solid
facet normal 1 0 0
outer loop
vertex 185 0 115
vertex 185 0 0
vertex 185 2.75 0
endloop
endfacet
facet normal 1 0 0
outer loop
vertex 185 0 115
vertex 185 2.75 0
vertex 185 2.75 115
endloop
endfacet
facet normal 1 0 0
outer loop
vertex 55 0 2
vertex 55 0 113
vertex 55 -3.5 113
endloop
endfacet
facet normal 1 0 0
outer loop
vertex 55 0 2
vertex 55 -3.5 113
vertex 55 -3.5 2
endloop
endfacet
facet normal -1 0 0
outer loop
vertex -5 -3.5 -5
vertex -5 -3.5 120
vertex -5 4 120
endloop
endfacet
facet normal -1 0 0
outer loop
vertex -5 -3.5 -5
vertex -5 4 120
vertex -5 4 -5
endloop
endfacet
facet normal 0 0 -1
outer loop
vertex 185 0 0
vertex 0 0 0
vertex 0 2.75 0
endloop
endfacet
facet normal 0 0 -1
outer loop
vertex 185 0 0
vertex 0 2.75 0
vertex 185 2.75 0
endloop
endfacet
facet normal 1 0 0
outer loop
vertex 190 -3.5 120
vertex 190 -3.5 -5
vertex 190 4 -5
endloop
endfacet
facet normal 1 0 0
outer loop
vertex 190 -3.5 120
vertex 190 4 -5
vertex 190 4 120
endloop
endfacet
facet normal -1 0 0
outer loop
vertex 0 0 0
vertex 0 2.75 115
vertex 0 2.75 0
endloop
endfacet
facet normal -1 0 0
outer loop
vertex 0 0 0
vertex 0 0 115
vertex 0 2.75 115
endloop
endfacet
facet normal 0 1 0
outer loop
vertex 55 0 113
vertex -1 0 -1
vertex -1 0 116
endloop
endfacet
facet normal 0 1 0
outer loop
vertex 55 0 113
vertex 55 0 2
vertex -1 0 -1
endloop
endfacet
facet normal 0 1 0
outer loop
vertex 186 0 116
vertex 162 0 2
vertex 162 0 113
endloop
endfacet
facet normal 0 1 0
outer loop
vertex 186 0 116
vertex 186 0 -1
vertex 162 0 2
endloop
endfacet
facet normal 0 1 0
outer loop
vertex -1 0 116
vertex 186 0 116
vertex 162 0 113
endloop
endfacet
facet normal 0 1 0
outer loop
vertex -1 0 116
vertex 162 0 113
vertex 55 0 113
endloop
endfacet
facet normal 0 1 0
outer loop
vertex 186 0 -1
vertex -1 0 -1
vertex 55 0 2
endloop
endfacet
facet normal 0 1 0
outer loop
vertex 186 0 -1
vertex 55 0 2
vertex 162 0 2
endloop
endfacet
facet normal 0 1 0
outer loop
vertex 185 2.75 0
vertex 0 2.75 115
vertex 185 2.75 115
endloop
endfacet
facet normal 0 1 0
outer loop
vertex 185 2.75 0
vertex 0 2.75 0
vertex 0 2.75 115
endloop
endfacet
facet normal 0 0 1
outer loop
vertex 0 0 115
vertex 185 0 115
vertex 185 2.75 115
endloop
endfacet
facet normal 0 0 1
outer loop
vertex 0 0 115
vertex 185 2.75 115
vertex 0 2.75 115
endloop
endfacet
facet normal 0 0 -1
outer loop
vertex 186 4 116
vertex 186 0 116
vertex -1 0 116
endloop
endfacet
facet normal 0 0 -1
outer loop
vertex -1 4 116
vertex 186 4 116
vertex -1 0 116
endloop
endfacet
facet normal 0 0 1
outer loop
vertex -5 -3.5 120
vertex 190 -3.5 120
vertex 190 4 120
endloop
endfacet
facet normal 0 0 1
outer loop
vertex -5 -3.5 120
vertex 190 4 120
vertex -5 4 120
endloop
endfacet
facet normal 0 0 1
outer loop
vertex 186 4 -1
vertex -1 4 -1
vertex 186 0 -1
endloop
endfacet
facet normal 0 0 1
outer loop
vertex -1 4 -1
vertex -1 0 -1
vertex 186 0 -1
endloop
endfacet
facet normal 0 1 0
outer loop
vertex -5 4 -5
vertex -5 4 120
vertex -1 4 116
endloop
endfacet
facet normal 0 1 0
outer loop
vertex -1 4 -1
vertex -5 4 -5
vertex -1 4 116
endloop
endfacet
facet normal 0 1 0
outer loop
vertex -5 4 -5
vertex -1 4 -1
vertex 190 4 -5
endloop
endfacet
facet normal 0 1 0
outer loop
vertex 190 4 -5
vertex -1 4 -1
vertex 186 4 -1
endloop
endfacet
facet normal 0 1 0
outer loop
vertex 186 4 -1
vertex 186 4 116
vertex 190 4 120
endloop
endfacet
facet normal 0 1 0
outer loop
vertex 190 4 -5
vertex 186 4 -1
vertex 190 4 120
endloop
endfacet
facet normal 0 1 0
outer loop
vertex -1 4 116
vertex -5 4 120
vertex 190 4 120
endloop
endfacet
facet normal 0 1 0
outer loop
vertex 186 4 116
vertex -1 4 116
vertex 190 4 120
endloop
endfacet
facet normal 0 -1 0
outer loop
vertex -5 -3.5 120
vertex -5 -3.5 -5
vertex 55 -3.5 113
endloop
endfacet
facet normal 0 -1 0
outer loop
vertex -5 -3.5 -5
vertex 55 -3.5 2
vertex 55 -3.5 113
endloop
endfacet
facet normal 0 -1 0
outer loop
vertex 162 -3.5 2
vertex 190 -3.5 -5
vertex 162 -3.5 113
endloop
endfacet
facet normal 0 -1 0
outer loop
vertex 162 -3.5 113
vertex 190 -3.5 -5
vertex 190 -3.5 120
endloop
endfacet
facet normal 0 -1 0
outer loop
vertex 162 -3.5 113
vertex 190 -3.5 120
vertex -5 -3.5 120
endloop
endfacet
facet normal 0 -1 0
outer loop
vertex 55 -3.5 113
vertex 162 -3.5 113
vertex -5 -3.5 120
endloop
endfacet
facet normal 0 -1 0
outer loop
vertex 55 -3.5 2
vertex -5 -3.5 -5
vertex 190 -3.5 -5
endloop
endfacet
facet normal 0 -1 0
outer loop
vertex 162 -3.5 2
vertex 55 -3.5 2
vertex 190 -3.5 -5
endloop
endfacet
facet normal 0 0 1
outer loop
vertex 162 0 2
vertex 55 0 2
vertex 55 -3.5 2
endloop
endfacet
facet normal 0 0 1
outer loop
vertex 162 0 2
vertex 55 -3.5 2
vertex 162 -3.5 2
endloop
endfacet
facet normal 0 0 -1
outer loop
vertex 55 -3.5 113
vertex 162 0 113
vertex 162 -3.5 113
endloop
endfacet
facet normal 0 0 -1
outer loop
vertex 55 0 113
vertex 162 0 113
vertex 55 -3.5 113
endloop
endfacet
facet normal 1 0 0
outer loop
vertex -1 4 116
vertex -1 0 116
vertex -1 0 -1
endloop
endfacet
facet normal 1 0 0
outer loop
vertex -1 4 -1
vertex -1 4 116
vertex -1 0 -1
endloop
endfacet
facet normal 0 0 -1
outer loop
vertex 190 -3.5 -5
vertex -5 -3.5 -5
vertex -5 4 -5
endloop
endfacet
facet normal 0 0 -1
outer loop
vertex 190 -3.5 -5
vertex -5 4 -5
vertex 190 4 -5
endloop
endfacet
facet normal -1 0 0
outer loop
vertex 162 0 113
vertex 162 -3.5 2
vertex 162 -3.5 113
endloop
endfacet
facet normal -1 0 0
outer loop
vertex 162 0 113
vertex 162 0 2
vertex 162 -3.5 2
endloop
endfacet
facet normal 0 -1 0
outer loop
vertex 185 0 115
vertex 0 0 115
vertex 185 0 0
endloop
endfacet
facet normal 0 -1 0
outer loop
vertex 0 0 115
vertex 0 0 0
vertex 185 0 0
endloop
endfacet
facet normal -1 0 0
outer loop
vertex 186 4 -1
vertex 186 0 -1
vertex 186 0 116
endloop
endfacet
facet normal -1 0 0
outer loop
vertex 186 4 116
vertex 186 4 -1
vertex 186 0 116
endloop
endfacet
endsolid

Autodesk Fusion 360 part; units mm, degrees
sketch "bk" plane through (0, 0, 0) normal (0, 1, 0) x (1, 0, 0)
  line L0 (0, 0) -> (185, 0)
  line L1 (185, 0) -> (185, -115)
  line L2 (185, -115) -> (0, -115)
  line L3 (0, -115) -> (0, 0)
  line L4 (183, -113) -> (2, -113)
  line L5 (2, -113) -> (2, -2)
  line L6 (2, -2) -> (183, -2)
  line L7 (183, -2) -> (183, -113)
  dimension "d1" = 185
  dimension "d2" = 115
  dimension "d3" = 2
extrude "Extrude1" add sketch "bk" along normal blind 2.75 contours L0 L1 L2 L3 | L4 L5 L6 L7 makes body 1
extrude "Extrude1'" add sketch "bk" against normal blind 3.5 separate body makes body 2 in component "Component"
sketch "Sketch1" plane through (0, 2.75, 0) normal (0, 1, 0) x (-1, 0, 0) in component "Component"
  line L0 (0, 115) -> (-185, 115)
  line L1 (-185, 115) -> (-185, 0)
  line L2 (-185, 0) -> (0, 0)
  line L3 (0, 0) -> (0, 115)
  line L4 (3.7132, 61.0694) -> (3.7132, 47.7442) construction
  line L5 (3.7132, 47.7442) -> (13.7132, 47.7442) construction
  line L6 (13.7132, 47.7442) -> (13.7132, 61.0694) construction
  line L7 (13.7132, 61.0694) -> (3.7132, 61.0694) construction
extrude "Extrude2" add 1 faces at (2, -1.1667, 76) along direction (1, 0, 0) blind 53 on bodies 2 bodies 2 in component "Component"
extrude "Extrude3" add 1 faces at (183, -1.1667, 39) along direction (-1, 0, 0) blind 21 on bodies 2 bodies 2 in component "Component"
sketch "Sketch2" plane through (0, -3.5, 0) normal (0, -1, 0) x (1, 0, 0) in component "Component"
  line L0 (162, 2) -> (55, 2)
  line L1 (55, 2) -> (55, 113)
  line L2 (55, 113) -> (162, 113)
  line L3 (162, 113) -> (162, 2)
  line L4 (185, 115) -> (0, 115)
  line L5 (0, 115) -> (0, 0)
  line L6 (0, 0) -> (185, 0)
  line L7 (185, 0) -> (185, 115)
  line L8 (-5, -5) -> (190, -5)
  line L9 (190, -5) -> (190, 120)
  line L10 (190, 120) -> (-5, 120)
  line L11 (-5, 120) -> (-5, -5)
  line L12 (-1, -1) -> (186, -1)
  line L13 (186, -1) -> (186, 116)
  line L14 (186, 116) -> (-1, 116)
  line L15 (-1, 116) -> (-1, -1)
  dimension "d12" = 5
  dimension "d13" = 1
extrude "Extrude4" add sketch "Sketch2" against normal blind 3.5 contours L8 L9 L10 L11 | L12 L13 L14 L15 bodies 2 in component "Component"
extrude "Extrude5" add sketch "Sketch2" against normal blind 7.5 contours L8 L9 L10 L11 bodies 2 in component "Component"
sketch "Sketch3" plane through (0, 0, 0) normal (0, 1, 0) x (1, 0, 0) in component "Component"
component "Component" placed x (1, 0, 0) y (0, 1, 0) z (0, 0, 1) at (0, 0, 0)
equation "d16 = -4.5 mm - 3 mm"
